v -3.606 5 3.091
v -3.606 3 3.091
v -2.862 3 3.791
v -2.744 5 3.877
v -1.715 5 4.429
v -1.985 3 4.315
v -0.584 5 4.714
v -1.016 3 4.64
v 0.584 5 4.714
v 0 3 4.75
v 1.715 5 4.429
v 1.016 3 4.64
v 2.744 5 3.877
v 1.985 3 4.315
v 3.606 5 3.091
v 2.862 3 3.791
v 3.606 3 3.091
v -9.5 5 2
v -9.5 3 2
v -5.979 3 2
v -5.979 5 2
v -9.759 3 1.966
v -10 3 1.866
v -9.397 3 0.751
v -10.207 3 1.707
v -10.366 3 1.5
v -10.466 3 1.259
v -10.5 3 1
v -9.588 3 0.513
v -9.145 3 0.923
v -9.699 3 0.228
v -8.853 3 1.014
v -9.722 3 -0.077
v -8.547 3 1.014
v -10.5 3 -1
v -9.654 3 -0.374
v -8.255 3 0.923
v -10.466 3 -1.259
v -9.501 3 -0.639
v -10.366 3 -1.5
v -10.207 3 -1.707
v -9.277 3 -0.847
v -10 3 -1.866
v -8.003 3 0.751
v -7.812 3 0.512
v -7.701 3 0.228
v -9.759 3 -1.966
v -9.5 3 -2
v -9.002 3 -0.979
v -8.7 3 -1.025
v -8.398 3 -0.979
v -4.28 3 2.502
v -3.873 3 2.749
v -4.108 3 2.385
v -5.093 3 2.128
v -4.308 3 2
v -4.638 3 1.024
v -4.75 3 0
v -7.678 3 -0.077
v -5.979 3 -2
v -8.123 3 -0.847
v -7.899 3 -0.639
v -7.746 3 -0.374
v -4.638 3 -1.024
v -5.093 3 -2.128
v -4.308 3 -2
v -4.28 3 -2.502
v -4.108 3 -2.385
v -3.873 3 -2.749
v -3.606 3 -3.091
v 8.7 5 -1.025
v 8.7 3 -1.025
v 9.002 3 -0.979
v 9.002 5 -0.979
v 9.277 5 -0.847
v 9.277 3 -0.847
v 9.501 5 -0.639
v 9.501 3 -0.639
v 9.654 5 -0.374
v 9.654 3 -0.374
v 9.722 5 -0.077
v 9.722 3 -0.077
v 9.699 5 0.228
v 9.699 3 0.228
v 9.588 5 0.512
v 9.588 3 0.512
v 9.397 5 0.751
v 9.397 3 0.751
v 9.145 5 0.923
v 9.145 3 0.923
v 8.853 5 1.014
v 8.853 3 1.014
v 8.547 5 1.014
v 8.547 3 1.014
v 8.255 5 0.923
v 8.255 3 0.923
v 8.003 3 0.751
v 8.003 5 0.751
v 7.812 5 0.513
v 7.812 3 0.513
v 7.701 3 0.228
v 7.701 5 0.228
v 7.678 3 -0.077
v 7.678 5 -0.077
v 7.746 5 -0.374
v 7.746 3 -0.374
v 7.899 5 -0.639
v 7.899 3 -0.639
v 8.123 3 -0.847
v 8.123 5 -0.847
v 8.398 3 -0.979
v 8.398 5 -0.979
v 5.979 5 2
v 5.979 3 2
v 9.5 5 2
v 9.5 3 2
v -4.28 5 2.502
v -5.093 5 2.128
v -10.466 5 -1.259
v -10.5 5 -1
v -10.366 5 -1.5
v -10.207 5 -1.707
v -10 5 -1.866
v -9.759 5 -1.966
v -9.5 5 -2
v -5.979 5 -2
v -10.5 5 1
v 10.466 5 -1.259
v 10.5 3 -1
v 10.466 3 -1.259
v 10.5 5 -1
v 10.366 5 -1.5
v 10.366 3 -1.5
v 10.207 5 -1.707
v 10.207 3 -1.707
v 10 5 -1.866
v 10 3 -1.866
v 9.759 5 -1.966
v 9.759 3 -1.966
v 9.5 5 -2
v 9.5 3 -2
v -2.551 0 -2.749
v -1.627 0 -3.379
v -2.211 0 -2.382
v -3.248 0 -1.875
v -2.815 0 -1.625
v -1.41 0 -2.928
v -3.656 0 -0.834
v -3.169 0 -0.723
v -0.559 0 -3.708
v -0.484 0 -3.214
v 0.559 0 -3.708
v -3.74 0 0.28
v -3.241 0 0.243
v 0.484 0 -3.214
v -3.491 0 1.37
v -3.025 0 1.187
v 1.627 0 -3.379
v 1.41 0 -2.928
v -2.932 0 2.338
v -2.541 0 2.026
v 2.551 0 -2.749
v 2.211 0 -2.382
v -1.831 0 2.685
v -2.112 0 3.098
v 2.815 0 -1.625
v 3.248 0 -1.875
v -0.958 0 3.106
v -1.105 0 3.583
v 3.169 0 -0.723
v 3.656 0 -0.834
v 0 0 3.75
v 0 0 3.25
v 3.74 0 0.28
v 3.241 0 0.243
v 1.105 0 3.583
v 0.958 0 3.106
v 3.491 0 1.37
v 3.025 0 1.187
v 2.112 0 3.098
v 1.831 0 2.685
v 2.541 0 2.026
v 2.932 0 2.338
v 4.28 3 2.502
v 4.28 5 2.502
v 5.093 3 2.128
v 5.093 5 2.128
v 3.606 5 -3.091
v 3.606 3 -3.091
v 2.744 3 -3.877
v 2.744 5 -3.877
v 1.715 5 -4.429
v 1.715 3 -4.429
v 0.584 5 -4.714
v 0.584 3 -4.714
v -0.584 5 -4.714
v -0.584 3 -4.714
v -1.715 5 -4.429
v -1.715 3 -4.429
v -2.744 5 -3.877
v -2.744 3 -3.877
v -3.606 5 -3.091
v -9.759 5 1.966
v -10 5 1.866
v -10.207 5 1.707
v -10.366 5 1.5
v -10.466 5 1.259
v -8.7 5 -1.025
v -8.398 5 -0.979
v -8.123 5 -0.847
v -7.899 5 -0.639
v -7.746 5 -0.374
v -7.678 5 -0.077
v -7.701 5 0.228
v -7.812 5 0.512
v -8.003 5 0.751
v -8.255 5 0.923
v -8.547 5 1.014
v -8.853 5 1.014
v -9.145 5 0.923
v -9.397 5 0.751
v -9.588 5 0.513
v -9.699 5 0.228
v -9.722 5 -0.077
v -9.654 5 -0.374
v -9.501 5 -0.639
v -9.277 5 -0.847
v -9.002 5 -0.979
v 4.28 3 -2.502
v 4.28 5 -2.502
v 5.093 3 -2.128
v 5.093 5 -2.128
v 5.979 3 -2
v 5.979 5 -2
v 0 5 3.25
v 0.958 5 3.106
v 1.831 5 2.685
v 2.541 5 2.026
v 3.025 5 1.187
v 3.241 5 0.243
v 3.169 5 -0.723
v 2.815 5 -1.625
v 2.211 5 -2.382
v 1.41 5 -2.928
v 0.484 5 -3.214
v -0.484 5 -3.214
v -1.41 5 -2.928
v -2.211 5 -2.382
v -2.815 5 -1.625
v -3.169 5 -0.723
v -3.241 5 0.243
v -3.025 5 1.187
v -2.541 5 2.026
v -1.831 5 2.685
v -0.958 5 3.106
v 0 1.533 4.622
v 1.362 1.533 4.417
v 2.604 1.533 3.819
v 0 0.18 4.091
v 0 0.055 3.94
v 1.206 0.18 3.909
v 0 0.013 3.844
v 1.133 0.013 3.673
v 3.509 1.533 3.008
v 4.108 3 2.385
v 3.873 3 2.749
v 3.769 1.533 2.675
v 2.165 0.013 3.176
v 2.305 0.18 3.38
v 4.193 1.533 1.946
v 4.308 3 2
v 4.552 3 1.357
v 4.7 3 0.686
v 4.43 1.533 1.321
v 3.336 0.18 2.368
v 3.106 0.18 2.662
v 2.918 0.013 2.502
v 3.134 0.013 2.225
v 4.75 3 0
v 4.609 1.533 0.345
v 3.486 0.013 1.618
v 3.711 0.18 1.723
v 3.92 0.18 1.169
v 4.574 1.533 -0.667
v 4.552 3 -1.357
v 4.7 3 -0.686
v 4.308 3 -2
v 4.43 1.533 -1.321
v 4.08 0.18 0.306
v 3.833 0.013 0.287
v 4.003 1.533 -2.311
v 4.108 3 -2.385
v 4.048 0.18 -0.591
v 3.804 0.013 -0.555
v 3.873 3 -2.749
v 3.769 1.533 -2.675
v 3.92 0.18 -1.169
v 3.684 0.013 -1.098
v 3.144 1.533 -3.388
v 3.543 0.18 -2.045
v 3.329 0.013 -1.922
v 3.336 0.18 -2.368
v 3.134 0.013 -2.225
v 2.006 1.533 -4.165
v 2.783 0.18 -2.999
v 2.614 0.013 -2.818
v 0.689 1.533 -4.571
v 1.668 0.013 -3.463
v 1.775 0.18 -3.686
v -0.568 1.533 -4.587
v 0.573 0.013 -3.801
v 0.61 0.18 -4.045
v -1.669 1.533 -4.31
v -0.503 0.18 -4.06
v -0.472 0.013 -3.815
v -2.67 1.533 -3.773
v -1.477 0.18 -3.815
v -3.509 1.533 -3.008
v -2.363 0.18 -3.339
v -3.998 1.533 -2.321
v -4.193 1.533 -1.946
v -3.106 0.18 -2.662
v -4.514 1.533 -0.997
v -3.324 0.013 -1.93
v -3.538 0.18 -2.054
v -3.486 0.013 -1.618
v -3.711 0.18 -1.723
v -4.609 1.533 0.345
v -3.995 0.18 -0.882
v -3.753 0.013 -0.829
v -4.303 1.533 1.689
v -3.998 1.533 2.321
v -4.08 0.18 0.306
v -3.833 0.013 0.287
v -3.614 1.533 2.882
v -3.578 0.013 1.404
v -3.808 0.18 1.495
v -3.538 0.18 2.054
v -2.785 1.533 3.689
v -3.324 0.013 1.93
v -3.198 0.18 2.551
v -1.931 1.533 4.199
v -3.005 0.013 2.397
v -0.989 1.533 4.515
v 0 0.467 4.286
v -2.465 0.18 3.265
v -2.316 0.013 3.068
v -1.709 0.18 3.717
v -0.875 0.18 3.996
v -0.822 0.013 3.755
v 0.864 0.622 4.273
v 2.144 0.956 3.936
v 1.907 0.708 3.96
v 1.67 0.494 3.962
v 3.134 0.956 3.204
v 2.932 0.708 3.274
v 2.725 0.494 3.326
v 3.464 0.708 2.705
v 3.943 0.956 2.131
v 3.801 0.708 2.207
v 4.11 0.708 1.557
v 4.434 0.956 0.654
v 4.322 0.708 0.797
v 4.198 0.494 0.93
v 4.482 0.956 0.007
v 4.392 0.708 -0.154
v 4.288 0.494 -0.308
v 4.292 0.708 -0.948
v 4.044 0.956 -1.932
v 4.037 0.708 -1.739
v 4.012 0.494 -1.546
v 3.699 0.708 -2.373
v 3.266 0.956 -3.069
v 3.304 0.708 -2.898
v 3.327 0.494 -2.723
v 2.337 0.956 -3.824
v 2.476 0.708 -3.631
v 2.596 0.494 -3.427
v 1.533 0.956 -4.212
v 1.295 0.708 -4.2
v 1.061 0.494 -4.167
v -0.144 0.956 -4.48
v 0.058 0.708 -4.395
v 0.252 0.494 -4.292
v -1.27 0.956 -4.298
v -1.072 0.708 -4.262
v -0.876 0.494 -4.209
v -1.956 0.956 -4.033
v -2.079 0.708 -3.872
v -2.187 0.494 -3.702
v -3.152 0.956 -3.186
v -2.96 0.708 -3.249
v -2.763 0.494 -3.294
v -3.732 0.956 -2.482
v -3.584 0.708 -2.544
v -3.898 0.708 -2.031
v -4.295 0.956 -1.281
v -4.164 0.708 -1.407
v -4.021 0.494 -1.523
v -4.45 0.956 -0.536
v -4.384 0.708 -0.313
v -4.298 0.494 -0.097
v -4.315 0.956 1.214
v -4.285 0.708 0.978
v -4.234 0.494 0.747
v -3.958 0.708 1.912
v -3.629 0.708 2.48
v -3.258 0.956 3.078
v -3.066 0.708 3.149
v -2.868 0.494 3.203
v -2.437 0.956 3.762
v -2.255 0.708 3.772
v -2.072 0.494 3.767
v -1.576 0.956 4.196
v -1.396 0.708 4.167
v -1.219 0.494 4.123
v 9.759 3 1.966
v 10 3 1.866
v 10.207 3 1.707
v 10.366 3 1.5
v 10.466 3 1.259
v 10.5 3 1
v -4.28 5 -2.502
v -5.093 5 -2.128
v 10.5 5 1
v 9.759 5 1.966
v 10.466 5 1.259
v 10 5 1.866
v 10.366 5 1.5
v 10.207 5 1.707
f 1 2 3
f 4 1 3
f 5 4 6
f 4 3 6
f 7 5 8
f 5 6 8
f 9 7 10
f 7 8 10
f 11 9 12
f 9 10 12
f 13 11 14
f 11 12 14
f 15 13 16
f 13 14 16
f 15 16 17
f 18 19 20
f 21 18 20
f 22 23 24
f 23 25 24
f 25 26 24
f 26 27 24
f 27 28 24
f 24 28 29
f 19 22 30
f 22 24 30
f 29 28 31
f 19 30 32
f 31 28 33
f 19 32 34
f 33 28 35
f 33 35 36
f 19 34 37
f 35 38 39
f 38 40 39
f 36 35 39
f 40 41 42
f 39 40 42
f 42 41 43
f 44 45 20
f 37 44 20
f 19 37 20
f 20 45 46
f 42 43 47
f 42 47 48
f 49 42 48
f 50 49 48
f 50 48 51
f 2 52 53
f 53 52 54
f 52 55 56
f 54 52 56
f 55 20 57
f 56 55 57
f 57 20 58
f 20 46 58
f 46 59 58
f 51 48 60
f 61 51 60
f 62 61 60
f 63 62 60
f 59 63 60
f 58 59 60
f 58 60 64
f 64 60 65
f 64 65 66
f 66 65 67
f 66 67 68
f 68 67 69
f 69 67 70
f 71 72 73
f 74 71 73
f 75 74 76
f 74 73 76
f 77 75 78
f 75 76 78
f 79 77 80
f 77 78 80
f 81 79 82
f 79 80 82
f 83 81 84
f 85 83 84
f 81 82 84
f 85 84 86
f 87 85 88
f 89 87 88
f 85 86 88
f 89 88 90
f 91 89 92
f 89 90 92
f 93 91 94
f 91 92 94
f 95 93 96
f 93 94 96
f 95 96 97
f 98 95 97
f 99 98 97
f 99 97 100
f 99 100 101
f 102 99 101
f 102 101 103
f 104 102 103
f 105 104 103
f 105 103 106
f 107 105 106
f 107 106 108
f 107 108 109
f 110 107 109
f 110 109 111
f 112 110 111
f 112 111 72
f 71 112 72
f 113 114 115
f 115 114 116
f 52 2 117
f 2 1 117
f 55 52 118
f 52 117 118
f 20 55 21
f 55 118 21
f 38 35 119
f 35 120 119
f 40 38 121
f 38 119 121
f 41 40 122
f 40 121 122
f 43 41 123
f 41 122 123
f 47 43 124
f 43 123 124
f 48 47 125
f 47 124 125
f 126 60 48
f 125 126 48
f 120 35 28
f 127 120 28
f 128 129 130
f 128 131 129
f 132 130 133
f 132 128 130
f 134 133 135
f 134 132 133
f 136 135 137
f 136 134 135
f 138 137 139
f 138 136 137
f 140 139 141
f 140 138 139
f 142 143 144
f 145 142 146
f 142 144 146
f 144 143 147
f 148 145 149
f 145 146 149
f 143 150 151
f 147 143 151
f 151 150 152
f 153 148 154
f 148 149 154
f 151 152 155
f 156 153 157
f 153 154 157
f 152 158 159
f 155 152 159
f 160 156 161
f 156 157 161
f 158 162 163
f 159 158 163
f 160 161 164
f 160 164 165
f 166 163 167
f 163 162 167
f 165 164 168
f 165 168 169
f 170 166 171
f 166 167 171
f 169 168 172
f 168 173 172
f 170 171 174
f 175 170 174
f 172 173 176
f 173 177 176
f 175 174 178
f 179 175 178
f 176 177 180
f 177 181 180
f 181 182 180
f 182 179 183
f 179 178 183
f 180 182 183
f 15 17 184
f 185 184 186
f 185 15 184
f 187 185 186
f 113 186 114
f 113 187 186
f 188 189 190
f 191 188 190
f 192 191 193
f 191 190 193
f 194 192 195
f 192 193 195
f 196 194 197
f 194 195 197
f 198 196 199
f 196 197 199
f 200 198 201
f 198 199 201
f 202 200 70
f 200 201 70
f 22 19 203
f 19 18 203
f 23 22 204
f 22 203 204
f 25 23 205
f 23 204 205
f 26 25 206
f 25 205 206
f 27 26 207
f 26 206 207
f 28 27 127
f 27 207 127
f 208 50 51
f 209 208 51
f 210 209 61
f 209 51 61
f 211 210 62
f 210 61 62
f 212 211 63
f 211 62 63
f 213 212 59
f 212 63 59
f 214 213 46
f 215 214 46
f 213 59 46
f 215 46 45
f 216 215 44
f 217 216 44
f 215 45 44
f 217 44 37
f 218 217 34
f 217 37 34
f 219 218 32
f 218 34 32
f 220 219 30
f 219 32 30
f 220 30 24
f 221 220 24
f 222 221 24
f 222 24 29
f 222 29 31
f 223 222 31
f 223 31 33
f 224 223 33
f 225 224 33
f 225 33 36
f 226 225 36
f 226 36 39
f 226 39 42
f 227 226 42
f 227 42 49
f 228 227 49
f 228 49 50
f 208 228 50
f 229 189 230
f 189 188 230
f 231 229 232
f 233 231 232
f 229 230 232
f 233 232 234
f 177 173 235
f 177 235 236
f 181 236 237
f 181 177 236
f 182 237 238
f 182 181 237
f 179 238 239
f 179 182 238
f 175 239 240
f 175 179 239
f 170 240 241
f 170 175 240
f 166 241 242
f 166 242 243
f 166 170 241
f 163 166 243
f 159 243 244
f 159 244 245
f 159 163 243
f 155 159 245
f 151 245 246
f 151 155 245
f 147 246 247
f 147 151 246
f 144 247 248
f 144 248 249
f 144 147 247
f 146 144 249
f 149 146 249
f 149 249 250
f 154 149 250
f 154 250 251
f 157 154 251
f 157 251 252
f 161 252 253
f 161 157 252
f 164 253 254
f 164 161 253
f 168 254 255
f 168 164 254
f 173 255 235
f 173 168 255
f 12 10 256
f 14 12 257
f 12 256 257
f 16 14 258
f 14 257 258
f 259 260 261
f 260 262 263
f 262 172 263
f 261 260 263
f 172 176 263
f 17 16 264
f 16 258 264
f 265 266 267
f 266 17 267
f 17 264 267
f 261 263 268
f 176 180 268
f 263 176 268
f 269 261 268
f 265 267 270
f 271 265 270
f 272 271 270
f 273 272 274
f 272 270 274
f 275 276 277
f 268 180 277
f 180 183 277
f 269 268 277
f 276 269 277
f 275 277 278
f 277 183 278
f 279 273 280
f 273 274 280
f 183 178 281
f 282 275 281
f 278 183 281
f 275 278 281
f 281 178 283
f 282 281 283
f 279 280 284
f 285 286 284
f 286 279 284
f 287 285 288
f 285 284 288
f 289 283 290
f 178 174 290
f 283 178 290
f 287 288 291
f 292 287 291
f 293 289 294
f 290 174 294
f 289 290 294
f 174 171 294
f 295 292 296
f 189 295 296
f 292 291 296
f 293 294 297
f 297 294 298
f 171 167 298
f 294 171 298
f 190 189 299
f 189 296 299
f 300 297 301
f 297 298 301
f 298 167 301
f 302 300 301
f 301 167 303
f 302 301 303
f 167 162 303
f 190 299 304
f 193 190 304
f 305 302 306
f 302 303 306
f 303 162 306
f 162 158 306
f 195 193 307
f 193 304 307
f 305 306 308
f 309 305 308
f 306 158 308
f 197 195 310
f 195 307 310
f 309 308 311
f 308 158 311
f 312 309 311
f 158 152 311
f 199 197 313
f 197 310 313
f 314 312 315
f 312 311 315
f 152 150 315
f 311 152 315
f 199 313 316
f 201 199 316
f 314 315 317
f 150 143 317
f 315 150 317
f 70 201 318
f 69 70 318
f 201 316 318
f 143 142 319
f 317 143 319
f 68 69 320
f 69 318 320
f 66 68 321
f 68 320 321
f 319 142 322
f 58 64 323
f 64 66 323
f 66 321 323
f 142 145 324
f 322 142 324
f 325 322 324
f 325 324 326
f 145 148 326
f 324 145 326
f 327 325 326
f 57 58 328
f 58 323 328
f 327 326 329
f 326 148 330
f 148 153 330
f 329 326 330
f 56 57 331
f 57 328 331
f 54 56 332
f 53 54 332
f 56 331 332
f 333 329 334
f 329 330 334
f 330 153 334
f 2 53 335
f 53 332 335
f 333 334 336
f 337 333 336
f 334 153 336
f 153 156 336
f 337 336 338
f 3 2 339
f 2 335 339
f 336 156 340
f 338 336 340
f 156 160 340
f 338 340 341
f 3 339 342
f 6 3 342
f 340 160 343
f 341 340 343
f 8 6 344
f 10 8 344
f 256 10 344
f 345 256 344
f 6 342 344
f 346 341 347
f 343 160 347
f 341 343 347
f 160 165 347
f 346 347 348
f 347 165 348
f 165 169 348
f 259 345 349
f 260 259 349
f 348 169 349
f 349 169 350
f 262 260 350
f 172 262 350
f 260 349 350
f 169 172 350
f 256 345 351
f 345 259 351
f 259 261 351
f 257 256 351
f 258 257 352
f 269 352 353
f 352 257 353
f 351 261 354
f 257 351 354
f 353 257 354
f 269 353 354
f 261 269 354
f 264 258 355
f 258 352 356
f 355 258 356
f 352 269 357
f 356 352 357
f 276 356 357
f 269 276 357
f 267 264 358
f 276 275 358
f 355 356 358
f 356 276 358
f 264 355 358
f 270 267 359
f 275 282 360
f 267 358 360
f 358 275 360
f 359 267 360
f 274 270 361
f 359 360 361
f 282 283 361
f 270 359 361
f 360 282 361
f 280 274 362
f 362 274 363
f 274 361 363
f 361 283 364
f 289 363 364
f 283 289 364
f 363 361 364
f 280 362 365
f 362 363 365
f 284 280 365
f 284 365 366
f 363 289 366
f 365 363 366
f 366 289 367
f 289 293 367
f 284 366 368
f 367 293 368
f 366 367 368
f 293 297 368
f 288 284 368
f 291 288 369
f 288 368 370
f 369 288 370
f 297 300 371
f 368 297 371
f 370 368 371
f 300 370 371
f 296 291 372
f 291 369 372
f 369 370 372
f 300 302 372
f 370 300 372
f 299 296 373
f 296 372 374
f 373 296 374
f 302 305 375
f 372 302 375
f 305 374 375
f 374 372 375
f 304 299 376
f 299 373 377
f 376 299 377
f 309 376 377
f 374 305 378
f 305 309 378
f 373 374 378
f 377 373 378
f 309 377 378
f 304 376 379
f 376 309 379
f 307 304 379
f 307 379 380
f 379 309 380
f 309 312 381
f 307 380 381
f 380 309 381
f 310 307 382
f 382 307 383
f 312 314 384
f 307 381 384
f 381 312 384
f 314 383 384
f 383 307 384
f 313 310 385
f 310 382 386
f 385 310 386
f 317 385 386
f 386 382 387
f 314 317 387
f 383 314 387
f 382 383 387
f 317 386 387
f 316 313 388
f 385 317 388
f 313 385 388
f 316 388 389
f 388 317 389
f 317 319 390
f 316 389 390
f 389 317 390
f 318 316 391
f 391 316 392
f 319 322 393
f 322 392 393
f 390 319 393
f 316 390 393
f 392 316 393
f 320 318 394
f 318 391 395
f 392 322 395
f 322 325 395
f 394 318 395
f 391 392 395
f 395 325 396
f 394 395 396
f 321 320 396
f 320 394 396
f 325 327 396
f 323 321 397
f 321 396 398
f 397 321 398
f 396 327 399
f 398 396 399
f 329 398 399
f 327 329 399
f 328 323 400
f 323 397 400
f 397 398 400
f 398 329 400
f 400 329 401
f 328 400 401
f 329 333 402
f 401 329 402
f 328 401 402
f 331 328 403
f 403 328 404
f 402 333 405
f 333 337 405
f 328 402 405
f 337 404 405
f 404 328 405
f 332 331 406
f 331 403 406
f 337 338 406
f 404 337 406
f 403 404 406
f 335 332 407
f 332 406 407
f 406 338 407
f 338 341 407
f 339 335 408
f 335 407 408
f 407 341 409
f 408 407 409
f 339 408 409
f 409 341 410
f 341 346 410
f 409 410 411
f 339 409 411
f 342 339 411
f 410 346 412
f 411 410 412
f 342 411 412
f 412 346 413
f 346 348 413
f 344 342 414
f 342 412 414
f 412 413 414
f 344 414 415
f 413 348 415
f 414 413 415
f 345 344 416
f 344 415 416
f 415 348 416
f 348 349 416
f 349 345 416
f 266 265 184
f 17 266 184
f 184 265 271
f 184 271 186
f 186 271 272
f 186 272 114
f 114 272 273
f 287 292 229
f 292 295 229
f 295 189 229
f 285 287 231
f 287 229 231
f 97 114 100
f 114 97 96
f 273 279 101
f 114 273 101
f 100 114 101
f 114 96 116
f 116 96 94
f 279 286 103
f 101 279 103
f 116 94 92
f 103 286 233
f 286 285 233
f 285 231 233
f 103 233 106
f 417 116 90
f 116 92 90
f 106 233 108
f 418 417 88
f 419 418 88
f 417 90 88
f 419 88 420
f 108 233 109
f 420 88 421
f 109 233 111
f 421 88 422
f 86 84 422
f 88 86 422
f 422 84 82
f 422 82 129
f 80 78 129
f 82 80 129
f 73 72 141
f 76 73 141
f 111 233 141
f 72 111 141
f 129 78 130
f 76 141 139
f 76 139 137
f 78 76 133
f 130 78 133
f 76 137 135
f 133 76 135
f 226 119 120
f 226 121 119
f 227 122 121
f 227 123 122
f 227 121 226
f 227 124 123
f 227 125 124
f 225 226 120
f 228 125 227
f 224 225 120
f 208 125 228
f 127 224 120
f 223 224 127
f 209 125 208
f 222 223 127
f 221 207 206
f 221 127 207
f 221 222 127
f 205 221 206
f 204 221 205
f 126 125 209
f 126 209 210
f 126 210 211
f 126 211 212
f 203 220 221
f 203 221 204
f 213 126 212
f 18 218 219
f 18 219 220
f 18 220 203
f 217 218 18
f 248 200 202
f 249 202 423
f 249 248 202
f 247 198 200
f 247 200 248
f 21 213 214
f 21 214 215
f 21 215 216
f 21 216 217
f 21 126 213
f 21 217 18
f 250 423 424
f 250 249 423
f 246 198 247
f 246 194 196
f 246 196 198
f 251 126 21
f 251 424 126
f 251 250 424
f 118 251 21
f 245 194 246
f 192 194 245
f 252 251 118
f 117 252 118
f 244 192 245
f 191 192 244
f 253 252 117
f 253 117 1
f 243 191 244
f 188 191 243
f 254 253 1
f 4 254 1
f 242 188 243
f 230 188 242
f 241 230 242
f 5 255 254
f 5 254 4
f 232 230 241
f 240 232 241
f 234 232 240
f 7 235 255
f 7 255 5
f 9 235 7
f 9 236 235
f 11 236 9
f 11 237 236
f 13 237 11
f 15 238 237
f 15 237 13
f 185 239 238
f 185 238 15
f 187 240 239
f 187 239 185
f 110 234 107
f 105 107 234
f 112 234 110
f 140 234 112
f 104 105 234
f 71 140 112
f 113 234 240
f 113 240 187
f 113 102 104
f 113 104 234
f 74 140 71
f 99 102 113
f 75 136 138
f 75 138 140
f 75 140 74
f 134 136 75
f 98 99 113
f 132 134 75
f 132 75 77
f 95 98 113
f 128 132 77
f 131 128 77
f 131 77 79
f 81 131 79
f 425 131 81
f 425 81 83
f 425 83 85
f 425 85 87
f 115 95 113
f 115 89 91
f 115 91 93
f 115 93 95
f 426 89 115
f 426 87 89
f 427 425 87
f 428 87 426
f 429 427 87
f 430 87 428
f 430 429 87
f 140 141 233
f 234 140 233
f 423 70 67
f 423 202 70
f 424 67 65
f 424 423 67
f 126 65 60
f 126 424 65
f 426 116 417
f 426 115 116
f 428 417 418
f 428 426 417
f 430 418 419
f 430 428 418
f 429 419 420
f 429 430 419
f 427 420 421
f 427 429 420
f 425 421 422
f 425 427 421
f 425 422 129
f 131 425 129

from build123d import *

# Parameters (mm, degrees)
SKETCH1_R           = 4.75
SKETCH1_R_2         = 3.25
BOSS_EXTRUDE1_DEPTH = 5
BOSS_EXTRUDE2_START = -2
BOSS_EXTRUDE2_DEPTH = 2
SKETCH3_R           = 1.025
CUT_EXTRUDE1_DEPTH  = 12.908505364
FILLET1_R           = 3.125
FILLET2_R           = 1
FILLET3_SIZE        = 3
FILLET3_SIZE_2      = 1


with BuildPart() as part:
    # Sketch1 → Boss-Extrude1 (new body)
    with BuildSketch(Plane(origin=(0, 0, 0), x_dir=(1, 0, 0), z_dir=(0, 1, 0))):
        with Locations(Location((0, 0, 0), (0, 0, 270))):
            Circle(SKETCH1_R)
        with Locations(Location((0, 0, 0), (0, 0, 270))):
            Circle(SKETCH1_R_2, mode=Mode.SUBTRACT)
    extrude(amount=BOSS_EXTRUDE1_DEPTH)

    # Sketch2 → Boss-Extrude2 (add)
    with BuildSketch(Plane(origin=(0, 5, 0), x_dir=(1, 0, 0), z_dir=(0, 1, 0)).offset(BOSS_EXTRUDE2_START)):
        with BuildLine():
            ThreePointArc((4.75, 0), (4.63829195, -1.024083876), (4.308421985, -2))
            Line((4.308421985, -2), (10.5, -2))
            Line((10.5, -2), (10.5, 2))
            Line((10.5, 2), (4.308421985, 2))
            ThreePointArc((4.308421985, 2), (4.63829195, 1.024083876), (4.75, 0))
        make_face()
        with BuildLine():
            Line((-10.5, -2), (-4.308421985, -2))
            ThreePointArc((-4.308421985, -2), (-4.75, 0), (-4.308421985, 2))
            Line((-4.308421985, 2), (-10.5, 2))
            Line((-10.5, 2), (-10.5, -2))
        make_face()
    extrude(amount=BOSS_EXTRUDE2_DEPTH)

    # Sketch3 → Cut-Extrude1 (cut, through all)
    with BuildSketch(Plane.XZ.offset(-3)):
        with Locations(Location((8.7, 0, 0), (0, 0, 270))):
            Circle(SKETCH3_R)
        with Locations(Location((-8.7, 0, 0), (0, 0, 270))):
            Circle(SKETCH3_R)
    extrude(amount=-CUT_EXTRUDE1_DEPTH, mode=Mode.SUBTRACT)

    # Fillet1
    fillet1_edges = [part.edges().sort_by_distance(p)[0] for p in [
        (4.308421985, 4, 2),
        (4.308421985, 4, -2),
        (-4.308421985, 4, -2),
        (-4.308421985, 4, 2),
    ]]
    fillet(fillet1_edges, radius=FILLET1_R)

    # Fillet2
    fillet2_edges = [part.edges().sort_by_distance(p)[0] for p in [
        (10.5, 4, 2),
        (10.5, 4, -2),
        (-10.5, 4, -2),
        (-10.5, 4, 2),
    ]]
    fillet(fillet2_edges, radius=FILLET2_R)

    # Fillet3
    # an asymmetric fillet: 3, 1 mm, written as the material it takes off along each edge
    with BuildSketch(Plane(origin=(0, 0, 0), x_dir=(0, 0, 1), z_dir=(-1, 0, 0))) as fillet3_piece_1:
        with BuildLine():
            Bezier((4.75, FILLET3_SIZE), (4.75, 0), (4.75 - FILLET3_SIZE_2, 0), weights=[1, 0.707106781, 1])
            Line((4.75 - FILLET3_SIZE_2, 0), (4.75, 0))
            Line((4.75, 0), (4.75, FILLET3_SIZE))
        make_face()
    revolve(axis=Axis((0, 0, 0), (0, 1, 0)), mode=Mode.SUBTRACT)


solid = part.part
